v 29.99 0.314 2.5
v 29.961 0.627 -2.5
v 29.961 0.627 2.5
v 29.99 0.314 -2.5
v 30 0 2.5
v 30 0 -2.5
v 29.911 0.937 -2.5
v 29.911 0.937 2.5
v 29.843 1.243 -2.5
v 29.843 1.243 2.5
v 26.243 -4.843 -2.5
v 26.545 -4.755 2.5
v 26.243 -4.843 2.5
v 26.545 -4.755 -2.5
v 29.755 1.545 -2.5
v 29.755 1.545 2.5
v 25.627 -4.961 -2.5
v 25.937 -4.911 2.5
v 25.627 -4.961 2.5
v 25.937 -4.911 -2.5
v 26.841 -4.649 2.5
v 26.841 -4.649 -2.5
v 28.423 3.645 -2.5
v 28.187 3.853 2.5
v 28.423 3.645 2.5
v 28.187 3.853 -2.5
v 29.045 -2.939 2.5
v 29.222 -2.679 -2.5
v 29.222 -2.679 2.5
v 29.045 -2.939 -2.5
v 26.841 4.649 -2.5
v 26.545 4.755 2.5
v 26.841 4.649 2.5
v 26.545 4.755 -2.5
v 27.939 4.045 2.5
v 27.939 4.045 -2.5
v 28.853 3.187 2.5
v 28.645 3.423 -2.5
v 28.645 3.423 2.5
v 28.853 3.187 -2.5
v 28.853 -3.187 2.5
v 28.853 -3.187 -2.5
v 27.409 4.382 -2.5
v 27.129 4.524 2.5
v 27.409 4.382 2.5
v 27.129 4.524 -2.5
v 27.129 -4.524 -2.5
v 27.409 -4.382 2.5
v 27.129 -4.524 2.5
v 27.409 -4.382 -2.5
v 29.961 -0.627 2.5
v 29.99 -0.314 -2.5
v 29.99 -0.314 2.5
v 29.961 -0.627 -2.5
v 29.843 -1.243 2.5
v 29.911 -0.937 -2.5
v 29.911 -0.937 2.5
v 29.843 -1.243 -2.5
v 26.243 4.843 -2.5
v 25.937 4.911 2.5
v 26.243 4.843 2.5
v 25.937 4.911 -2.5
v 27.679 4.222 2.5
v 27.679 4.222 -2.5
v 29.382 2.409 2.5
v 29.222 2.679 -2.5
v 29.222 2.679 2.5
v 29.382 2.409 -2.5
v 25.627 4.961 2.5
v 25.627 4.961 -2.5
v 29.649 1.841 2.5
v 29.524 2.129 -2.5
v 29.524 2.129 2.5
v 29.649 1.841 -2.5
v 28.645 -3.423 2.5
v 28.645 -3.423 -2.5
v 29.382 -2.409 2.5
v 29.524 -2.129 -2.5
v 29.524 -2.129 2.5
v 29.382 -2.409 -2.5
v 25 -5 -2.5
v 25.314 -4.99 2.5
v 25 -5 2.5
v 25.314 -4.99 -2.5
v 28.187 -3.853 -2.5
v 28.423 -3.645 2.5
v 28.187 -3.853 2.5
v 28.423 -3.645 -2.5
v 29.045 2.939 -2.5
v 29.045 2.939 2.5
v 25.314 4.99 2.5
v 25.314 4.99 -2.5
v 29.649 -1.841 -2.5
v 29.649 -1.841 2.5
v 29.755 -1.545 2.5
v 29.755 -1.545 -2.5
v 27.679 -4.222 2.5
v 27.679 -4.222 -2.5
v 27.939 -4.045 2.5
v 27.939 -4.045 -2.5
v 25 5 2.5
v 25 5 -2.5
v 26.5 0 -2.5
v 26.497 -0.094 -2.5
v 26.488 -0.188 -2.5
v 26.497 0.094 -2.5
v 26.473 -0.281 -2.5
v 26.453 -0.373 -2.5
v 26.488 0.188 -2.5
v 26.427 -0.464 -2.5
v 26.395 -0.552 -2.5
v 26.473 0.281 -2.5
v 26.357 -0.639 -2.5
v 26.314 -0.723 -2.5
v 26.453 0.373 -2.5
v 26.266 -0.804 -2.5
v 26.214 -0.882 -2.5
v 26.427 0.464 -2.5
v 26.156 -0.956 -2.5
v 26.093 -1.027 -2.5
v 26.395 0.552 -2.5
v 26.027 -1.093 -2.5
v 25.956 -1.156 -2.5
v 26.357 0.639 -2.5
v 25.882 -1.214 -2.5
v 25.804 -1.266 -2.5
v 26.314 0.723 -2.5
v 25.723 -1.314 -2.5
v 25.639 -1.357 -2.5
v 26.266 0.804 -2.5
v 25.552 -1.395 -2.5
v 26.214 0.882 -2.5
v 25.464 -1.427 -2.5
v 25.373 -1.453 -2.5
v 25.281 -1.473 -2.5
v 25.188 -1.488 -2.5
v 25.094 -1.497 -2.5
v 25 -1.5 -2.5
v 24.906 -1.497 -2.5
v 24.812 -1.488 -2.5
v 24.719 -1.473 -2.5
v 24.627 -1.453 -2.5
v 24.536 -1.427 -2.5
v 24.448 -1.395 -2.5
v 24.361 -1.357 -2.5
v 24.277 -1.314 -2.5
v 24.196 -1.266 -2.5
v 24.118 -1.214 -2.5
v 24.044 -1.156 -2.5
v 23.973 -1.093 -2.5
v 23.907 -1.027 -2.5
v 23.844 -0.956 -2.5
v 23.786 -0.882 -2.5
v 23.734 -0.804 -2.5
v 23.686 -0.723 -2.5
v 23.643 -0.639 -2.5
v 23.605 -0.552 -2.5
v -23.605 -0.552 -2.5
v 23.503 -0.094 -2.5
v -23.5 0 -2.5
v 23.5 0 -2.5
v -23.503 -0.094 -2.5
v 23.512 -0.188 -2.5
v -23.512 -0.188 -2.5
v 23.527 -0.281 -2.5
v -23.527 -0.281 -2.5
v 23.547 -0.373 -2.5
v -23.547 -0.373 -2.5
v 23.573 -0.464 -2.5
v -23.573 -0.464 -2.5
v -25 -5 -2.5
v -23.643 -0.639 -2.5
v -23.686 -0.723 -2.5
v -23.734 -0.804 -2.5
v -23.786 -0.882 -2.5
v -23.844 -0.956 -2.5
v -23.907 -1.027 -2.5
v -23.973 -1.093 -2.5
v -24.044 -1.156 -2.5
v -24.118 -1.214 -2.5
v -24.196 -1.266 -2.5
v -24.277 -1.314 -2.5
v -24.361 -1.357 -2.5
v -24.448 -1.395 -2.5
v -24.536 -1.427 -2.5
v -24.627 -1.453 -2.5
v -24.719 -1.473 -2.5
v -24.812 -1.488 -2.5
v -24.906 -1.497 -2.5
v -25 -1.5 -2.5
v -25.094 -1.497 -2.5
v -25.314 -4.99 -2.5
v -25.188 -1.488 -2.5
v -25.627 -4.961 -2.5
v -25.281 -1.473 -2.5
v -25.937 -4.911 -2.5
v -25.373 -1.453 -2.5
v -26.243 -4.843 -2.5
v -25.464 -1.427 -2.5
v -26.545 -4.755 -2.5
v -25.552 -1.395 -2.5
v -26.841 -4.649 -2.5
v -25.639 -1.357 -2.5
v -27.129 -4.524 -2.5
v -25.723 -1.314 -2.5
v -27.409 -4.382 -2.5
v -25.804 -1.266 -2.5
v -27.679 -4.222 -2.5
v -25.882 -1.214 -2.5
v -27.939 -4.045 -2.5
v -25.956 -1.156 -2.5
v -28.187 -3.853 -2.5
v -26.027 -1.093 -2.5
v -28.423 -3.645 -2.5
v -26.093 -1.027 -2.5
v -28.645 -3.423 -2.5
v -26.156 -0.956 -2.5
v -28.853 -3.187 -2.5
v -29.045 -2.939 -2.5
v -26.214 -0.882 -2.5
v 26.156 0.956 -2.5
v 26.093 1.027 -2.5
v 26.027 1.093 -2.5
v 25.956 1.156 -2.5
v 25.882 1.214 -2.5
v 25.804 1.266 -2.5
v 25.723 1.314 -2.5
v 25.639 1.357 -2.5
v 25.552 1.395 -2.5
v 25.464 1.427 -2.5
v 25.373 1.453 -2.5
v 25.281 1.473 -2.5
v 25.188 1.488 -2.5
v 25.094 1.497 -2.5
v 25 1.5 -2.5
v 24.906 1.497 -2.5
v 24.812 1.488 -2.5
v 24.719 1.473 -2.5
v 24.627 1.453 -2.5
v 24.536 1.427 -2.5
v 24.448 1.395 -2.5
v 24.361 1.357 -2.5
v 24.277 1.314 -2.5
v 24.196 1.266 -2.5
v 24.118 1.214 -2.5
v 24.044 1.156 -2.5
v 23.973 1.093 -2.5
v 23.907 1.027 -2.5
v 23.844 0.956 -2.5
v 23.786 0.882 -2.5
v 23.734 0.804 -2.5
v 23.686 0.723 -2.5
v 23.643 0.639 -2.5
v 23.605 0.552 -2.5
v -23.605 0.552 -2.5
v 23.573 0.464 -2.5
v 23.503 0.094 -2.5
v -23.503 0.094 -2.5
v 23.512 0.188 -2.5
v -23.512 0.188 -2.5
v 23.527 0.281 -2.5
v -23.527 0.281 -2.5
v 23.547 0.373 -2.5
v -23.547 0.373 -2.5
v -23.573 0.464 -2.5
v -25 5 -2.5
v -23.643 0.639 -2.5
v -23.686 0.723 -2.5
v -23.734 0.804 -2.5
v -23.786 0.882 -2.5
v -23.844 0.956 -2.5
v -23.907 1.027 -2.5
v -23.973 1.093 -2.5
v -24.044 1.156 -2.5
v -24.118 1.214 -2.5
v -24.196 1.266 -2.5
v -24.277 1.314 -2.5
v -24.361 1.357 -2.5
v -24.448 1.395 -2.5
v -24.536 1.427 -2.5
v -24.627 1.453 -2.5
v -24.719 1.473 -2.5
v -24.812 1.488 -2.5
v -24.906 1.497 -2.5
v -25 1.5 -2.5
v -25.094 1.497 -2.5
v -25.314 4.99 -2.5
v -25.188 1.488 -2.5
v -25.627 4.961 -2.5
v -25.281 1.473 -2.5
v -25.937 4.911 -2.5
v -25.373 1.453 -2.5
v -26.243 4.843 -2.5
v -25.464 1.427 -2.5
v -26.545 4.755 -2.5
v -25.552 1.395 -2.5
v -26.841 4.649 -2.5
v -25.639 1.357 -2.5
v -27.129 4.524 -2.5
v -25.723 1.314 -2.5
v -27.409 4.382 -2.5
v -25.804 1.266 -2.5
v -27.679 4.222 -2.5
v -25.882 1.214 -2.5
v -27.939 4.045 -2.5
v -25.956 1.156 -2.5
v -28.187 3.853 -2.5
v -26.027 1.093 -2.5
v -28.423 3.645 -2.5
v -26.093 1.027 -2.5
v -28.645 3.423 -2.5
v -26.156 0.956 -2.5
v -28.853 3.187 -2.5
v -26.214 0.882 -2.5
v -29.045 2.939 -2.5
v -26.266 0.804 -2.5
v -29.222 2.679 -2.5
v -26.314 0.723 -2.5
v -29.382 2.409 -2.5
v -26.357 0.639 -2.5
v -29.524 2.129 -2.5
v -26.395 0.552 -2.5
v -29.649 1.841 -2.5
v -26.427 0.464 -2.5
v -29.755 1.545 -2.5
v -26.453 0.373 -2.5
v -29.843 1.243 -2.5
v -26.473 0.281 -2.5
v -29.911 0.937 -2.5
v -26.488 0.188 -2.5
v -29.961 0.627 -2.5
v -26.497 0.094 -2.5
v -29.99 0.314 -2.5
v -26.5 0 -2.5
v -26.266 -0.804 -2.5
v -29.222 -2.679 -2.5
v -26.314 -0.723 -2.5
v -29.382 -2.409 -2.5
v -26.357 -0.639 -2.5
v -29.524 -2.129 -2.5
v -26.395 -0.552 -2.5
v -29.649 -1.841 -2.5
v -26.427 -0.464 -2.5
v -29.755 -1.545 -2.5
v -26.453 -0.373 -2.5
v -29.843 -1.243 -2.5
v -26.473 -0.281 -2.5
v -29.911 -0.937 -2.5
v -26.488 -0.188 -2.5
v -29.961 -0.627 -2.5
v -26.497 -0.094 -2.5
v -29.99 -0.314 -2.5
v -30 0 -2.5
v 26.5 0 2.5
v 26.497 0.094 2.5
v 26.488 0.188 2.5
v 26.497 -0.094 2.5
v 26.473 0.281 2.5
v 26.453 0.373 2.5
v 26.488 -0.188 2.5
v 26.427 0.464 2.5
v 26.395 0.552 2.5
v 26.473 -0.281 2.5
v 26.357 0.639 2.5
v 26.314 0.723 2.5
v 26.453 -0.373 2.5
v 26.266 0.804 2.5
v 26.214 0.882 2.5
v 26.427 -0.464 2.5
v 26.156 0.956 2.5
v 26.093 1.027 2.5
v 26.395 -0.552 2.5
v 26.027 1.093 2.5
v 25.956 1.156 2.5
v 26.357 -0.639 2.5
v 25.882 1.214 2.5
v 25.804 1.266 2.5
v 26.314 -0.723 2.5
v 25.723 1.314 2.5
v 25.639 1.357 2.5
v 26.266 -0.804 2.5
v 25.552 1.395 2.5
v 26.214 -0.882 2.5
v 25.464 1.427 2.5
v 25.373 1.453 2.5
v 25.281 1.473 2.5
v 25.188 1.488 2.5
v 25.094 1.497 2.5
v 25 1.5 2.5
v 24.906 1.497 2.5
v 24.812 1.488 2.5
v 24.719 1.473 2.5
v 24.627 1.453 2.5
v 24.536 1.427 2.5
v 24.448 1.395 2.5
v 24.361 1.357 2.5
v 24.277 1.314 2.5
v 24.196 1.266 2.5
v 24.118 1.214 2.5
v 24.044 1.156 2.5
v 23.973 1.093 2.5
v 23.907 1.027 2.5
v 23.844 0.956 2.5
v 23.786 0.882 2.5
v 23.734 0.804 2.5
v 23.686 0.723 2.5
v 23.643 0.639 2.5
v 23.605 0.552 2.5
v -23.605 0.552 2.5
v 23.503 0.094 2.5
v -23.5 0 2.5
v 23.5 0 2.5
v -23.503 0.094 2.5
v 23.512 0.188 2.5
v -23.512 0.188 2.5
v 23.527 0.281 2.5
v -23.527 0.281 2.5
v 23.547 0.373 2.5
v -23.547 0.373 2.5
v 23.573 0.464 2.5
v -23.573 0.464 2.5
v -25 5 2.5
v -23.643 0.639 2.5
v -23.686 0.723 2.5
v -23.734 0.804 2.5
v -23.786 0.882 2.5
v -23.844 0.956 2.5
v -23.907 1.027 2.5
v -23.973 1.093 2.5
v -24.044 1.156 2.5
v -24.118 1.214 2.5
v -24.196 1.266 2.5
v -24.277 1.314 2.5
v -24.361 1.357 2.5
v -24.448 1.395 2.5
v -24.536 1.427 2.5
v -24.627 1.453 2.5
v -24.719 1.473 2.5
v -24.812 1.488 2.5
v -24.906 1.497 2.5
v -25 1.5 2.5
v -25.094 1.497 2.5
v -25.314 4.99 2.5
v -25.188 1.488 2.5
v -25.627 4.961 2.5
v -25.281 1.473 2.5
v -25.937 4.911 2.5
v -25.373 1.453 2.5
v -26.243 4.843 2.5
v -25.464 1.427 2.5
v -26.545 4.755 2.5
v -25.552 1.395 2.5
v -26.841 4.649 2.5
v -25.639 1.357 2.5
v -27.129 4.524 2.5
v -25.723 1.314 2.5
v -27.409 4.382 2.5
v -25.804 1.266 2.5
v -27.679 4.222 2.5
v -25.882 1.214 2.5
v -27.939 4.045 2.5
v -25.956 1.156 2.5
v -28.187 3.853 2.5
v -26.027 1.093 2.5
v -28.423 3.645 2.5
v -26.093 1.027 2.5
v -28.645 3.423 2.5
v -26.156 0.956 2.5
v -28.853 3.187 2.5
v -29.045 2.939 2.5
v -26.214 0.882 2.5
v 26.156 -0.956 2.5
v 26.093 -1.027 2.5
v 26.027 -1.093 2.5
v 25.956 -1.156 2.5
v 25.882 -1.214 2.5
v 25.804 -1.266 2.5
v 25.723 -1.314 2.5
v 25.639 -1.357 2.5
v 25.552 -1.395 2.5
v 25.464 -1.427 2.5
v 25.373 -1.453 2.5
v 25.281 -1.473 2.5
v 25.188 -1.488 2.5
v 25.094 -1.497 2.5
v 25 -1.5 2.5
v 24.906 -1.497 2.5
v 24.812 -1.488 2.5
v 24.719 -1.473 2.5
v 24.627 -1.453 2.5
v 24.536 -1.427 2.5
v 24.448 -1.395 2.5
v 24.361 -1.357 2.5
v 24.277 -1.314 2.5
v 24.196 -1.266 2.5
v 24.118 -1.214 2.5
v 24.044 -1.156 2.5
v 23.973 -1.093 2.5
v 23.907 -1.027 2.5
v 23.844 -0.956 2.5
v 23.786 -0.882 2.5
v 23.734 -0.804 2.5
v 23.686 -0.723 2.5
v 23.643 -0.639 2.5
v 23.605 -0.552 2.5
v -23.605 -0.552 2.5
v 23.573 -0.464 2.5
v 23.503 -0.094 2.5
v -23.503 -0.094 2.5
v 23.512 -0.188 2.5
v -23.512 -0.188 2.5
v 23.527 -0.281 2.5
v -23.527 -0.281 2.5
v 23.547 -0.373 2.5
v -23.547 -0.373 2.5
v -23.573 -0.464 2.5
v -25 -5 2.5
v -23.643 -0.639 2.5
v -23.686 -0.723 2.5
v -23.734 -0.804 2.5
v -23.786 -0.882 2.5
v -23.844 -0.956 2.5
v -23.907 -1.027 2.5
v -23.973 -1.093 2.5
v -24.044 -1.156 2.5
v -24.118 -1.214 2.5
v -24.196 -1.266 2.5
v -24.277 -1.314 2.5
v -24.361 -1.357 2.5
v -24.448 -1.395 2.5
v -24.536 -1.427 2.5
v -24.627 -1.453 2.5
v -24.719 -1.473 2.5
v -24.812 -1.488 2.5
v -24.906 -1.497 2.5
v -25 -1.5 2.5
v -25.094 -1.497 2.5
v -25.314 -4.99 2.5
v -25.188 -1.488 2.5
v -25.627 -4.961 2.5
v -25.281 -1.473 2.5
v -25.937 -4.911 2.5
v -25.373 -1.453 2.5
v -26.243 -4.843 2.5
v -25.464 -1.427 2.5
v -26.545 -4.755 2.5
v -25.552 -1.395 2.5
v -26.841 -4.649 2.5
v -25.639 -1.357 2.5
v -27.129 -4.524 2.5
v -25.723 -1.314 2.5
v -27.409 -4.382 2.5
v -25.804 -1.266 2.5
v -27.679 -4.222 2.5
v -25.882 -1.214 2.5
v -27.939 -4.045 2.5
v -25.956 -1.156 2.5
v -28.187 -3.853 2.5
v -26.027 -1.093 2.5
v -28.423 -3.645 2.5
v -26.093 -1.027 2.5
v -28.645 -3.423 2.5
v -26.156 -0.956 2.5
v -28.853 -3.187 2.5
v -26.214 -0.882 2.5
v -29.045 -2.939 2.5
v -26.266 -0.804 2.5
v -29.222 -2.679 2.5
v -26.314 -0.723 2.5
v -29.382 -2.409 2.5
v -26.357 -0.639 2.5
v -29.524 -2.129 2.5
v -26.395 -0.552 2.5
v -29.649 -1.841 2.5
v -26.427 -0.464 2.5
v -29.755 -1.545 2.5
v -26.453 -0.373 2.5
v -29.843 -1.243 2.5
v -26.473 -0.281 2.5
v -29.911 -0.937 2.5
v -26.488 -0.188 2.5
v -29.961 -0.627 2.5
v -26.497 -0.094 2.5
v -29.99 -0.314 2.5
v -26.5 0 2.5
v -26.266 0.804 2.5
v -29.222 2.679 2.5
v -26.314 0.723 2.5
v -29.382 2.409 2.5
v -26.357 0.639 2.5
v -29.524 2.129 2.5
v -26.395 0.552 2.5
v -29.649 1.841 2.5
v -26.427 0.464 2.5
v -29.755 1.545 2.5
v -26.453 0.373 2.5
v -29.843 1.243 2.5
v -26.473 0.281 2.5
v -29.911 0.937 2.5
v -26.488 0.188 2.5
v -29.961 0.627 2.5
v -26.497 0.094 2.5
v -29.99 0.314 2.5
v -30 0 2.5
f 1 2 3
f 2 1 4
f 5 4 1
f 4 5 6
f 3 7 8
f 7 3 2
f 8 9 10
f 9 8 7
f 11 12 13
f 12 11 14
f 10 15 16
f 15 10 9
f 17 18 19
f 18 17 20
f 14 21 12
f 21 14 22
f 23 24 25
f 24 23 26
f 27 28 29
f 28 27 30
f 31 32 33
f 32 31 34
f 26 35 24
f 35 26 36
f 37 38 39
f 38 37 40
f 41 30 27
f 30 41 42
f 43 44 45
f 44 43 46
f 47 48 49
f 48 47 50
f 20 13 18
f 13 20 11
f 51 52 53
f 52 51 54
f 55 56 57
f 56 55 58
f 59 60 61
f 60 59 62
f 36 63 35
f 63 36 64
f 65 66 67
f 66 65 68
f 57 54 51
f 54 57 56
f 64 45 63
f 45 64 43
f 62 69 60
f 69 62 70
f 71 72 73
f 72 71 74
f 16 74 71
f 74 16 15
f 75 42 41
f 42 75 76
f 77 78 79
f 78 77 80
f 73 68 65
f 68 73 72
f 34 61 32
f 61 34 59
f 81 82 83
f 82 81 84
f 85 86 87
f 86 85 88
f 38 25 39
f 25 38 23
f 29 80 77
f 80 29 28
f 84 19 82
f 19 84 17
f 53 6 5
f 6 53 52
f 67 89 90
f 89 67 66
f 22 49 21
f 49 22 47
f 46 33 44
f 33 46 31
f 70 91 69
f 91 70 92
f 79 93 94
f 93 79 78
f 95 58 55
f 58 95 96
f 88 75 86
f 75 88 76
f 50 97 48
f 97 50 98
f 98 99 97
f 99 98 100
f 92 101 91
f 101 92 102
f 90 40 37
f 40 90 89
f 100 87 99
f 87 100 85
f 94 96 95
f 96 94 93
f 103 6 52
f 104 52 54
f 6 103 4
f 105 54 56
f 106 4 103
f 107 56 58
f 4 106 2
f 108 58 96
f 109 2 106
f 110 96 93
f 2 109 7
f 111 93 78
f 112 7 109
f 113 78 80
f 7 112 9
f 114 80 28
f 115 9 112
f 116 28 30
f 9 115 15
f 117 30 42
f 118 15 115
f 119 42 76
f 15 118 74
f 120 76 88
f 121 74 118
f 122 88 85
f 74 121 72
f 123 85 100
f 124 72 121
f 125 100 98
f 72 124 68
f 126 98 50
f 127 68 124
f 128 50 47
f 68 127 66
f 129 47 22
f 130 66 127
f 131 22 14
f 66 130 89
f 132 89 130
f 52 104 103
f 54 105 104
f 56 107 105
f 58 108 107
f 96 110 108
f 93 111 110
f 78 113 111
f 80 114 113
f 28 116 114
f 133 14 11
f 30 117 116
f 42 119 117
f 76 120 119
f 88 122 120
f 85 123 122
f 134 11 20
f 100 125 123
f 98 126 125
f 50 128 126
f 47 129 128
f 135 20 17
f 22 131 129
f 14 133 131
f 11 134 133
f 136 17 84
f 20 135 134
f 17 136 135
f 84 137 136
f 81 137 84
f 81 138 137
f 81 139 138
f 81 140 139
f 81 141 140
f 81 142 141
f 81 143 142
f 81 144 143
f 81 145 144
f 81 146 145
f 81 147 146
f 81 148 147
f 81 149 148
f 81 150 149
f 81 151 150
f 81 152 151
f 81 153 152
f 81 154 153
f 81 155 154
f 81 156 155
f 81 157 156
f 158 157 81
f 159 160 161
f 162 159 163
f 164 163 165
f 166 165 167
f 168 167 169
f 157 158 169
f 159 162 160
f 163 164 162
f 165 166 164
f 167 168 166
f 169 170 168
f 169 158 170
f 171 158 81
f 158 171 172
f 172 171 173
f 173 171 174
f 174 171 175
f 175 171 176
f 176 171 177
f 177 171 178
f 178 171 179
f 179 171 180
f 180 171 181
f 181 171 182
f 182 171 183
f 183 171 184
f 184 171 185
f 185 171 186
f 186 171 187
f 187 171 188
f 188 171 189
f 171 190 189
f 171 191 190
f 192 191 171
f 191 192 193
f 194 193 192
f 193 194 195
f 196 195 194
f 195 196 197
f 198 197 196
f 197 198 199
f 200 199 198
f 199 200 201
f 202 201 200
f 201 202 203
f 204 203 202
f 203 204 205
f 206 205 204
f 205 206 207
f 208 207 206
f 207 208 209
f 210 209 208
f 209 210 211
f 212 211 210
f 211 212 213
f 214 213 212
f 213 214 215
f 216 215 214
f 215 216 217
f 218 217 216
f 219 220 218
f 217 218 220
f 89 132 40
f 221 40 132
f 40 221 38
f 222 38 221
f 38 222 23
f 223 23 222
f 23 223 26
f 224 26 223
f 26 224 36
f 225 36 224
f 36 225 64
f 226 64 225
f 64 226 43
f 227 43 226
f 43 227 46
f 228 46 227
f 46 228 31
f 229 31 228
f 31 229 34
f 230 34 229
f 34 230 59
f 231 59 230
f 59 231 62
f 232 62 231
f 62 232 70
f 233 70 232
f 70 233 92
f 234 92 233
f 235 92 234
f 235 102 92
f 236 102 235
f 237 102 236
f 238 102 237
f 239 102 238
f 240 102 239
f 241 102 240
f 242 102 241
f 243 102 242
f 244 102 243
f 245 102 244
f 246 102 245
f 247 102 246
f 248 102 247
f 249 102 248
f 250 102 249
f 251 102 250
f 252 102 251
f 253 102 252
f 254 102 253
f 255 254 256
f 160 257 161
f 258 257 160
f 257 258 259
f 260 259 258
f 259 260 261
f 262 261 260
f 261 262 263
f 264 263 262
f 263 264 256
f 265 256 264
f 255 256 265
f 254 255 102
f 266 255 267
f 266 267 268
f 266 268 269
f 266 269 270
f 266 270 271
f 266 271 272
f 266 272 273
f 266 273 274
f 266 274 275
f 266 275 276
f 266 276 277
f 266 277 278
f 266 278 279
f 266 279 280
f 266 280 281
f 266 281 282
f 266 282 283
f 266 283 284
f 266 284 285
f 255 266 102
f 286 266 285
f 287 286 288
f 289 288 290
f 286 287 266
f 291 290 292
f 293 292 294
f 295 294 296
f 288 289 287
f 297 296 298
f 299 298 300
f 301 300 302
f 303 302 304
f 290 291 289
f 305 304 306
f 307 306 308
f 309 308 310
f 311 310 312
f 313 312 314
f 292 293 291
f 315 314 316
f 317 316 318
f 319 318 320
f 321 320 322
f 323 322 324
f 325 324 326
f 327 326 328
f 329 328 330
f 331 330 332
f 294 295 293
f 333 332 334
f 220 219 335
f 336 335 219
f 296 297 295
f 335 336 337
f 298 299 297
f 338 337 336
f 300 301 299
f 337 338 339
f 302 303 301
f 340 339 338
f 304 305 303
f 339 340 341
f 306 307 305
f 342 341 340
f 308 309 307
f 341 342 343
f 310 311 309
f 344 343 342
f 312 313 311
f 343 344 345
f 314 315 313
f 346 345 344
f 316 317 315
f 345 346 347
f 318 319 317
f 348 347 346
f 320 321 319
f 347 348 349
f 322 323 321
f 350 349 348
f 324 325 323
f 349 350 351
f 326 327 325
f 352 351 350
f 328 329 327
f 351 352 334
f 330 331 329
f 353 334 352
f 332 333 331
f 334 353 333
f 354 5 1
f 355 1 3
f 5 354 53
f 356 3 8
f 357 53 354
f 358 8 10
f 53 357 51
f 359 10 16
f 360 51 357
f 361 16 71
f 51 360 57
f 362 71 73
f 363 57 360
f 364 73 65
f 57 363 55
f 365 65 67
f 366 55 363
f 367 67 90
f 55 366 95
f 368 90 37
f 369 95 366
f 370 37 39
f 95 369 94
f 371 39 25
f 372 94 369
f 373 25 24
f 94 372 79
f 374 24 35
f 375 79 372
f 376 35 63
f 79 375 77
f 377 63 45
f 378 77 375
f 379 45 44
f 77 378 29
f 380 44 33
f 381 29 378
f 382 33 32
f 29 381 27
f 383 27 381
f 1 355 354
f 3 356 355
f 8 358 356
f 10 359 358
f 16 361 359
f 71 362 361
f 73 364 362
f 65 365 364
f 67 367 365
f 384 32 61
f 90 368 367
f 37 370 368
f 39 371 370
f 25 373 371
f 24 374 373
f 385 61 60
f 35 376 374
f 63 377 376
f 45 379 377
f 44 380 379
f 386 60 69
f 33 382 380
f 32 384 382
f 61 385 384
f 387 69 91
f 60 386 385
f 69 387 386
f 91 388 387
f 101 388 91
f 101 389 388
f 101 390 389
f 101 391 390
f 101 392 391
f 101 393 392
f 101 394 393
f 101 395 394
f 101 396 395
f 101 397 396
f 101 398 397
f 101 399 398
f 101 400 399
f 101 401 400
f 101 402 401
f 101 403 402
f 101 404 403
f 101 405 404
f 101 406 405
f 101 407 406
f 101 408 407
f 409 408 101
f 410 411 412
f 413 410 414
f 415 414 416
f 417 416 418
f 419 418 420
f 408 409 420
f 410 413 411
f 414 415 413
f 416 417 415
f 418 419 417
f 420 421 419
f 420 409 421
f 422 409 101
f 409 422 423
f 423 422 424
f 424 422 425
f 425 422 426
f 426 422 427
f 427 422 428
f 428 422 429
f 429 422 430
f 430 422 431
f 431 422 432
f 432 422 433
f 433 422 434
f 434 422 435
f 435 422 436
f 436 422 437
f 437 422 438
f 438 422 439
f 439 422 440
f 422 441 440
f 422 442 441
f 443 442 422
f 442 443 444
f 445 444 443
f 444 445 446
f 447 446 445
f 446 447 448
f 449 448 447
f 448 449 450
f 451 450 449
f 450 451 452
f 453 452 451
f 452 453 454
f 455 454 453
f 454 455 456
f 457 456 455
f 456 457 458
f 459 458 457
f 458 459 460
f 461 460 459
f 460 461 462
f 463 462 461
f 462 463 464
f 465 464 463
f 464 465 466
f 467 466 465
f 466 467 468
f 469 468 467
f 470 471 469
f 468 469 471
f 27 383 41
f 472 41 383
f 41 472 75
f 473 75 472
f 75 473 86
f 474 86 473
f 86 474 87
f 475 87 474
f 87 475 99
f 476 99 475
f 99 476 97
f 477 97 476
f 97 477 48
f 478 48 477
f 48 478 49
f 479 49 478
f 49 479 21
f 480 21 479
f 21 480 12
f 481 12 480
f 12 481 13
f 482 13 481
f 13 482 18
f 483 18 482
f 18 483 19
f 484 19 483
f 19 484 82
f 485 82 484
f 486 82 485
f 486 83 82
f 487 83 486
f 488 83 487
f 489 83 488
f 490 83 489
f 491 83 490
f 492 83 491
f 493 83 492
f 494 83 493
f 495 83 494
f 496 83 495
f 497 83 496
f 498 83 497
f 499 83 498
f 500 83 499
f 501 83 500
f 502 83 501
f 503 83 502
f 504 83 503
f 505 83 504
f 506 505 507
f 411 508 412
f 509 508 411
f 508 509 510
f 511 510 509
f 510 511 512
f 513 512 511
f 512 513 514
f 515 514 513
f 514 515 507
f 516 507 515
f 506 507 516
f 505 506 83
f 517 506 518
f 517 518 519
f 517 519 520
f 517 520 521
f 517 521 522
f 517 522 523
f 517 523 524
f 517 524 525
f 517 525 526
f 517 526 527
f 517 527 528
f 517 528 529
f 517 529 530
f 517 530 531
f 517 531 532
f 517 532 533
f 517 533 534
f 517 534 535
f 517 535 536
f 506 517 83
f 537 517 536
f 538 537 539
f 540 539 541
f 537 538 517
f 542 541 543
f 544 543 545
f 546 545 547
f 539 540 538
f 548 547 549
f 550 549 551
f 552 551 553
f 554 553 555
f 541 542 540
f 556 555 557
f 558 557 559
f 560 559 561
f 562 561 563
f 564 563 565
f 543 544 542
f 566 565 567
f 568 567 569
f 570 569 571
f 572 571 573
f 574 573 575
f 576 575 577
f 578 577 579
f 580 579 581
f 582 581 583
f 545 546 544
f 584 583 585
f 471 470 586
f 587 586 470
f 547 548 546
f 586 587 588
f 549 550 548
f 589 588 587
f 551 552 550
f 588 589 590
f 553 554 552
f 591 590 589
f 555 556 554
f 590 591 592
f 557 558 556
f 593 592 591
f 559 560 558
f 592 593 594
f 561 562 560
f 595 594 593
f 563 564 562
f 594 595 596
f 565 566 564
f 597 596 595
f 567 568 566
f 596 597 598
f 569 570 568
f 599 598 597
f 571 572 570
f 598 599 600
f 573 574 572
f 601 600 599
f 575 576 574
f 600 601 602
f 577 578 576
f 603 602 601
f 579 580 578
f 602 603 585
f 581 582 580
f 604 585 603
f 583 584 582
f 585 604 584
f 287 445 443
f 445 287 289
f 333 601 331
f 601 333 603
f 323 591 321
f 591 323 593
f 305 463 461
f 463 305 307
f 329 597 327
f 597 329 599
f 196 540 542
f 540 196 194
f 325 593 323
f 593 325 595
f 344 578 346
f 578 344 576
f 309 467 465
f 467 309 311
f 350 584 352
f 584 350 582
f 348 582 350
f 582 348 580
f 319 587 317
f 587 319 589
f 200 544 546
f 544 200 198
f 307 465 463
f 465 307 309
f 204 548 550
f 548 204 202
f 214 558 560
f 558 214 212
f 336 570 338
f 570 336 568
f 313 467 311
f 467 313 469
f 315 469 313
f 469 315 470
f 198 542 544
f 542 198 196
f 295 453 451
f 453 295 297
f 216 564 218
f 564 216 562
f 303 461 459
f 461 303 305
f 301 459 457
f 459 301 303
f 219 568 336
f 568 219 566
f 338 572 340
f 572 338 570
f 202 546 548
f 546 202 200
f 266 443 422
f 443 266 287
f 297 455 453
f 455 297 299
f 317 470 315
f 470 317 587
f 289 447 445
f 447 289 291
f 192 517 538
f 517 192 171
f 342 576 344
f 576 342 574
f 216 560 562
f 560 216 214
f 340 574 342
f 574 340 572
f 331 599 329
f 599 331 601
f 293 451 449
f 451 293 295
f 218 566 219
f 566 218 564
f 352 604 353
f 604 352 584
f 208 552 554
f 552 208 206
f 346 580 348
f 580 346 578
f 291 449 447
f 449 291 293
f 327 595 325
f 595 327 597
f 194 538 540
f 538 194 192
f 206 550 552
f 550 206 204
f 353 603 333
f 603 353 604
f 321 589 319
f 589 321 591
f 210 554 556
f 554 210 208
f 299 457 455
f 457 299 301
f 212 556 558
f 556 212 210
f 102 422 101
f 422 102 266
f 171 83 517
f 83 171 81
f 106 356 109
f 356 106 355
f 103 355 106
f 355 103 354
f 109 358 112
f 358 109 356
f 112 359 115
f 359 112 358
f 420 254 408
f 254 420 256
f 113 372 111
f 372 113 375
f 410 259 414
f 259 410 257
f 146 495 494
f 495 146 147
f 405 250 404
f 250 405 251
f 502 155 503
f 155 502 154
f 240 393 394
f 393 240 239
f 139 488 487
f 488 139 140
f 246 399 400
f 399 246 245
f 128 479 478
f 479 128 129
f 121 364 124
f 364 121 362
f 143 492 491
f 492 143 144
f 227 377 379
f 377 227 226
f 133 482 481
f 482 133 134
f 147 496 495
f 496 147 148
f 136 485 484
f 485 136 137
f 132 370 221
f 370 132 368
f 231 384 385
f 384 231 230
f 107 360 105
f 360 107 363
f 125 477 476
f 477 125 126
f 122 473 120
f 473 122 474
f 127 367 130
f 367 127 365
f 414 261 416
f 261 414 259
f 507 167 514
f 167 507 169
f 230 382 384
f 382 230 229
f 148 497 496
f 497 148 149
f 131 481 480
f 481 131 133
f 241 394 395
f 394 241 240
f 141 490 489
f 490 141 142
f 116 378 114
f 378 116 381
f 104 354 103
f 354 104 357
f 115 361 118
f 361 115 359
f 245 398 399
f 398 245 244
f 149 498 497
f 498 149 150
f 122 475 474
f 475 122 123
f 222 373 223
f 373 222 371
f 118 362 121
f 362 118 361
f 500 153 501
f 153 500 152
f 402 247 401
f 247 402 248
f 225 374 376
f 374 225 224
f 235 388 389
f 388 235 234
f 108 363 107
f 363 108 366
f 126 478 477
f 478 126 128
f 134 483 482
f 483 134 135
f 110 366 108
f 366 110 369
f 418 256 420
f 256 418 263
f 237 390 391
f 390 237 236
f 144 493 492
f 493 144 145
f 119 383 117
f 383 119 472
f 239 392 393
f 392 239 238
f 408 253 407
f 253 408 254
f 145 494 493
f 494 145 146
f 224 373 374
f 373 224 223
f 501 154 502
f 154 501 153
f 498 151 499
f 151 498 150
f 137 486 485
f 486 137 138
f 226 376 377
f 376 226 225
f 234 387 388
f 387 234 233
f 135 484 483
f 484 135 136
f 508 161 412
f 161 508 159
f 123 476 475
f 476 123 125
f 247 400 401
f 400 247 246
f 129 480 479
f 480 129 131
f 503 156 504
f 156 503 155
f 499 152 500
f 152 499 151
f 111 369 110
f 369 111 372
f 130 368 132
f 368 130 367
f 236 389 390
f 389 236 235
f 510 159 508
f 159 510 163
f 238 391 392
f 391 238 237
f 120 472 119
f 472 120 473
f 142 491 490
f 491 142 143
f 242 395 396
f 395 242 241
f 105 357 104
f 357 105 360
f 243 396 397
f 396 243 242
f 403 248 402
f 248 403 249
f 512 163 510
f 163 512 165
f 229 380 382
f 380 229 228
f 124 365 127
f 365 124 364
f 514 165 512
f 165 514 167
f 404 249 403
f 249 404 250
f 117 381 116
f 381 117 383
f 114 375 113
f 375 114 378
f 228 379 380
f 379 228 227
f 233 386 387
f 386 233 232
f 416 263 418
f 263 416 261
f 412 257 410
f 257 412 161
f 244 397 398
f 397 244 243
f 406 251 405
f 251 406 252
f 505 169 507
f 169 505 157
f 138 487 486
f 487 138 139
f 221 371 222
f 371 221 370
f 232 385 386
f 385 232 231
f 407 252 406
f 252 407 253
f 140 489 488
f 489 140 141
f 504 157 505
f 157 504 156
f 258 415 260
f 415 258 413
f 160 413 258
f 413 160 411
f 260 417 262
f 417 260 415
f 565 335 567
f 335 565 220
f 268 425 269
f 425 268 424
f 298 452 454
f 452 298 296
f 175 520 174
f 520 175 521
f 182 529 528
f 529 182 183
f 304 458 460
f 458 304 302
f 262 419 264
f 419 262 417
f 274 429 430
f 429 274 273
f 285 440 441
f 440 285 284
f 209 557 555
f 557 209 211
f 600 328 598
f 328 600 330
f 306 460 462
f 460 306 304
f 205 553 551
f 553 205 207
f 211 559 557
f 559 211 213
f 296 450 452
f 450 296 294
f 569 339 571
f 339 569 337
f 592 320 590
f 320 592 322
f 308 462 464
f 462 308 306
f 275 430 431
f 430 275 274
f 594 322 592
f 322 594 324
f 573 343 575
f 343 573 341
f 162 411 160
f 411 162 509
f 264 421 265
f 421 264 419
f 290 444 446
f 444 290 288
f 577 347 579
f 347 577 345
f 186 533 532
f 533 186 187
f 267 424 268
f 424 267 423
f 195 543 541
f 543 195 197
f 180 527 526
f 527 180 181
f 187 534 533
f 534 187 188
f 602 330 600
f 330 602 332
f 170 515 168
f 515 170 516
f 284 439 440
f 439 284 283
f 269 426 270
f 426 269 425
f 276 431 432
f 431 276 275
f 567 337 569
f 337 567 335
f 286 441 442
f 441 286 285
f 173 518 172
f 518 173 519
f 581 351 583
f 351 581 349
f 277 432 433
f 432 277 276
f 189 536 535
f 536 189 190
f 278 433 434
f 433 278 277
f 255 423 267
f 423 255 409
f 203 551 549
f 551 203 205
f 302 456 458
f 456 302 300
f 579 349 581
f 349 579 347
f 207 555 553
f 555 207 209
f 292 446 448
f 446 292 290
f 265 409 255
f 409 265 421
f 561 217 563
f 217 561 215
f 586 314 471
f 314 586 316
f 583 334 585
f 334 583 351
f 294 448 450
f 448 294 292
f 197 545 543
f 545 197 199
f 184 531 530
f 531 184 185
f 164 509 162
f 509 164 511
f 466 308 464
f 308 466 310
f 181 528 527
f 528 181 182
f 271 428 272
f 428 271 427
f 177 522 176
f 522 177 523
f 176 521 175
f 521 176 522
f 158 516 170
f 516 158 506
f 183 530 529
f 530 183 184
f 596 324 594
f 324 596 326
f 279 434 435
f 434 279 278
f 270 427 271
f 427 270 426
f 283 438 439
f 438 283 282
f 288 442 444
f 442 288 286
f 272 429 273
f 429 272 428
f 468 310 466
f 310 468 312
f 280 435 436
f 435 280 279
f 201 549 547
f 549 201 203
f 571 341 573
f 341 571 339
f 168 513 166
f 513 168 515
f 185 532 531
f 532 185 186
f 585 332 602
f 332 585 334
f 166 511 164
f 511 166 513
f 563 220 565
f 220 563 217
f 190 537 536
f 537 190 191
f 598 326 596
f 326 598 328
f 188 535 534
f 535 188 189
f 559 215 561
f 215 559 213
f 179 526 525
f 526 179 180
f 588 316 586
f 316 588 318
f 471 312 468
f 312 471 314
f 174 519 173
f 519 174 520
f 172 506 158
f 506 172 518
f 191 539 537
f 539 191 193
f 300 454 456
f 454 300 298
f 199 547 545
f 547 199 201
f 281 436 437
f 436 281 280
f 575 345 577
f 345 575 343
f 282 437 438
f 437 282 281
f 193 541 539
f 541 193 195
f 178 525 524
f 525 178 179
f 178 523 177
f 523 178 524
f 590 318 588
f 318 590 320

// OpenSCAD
$fn=100;

height = 10;
width = 50;
depth = 10;
rodDia = 8;
screwDia = 3;

outHeight = 6;
outDia = 8;

module arm() difference() {
    difference() {
        union() {
            translate([width/2, 0, 0]) cylinder(height/2, depth/2, depth/2, true);
            translate([-width/2, 0, 0]) cylinder(height/2, depth/2, depth/2, true);
            cube([ width, depth, height/2], true);
        }
        translate([width/2, 0, 0]) cylinder(height/2,       screwDia/2, screwDia/2, true);
    }
    translate([-width/2, 0, 0]) cylinder(height/2,       screwDia/2, screwDia/2, true);
}

module center() difference() {
       translate([0,0,-height/4]) cylinder( height, rodDia, rodDia );
       union() {
            translate([0,0,height/2]) cylinder( height/2, rodDia/2, rodDia/2, true );
           rotate([0,0,90]) translate([-rodDia/2,0,height/2]) cube([ rodDia, rodDia, height/2], true );
       }
   }
   
   
module outlet() difference() {
   difference() {
    difference() {
        union() {
            translate([width/4, 0, 0]) cylinder(outHeight, depth*0.75, depth*0.75, true);
            translate([-width/4, 0, 0]) cylinder(outHeight, depth*0.75, depth*0.75, true);
            cube([ width/2, depth*1.5, outHeight], true);
        }
        translate([width/4, 0, 0]) cylinder(outHeight,       screwDia/2, screwDia/2, true);
    }
    translate([-width/4, 0, 0]) cylinder(outHeight,       screwDia/2, screwDia/2, true);
    }
    cylinder(outHeight, outDia/2, outDia/2, true);
}
      
module externalHolder() union() {
    rotate([0,0,45]) {
        arm();
    }
    rotate([0,0,-45]) {
        arm();
    }
}
  
module rodHolder() union() {
    externalHolder();
    center();
}

arm();
